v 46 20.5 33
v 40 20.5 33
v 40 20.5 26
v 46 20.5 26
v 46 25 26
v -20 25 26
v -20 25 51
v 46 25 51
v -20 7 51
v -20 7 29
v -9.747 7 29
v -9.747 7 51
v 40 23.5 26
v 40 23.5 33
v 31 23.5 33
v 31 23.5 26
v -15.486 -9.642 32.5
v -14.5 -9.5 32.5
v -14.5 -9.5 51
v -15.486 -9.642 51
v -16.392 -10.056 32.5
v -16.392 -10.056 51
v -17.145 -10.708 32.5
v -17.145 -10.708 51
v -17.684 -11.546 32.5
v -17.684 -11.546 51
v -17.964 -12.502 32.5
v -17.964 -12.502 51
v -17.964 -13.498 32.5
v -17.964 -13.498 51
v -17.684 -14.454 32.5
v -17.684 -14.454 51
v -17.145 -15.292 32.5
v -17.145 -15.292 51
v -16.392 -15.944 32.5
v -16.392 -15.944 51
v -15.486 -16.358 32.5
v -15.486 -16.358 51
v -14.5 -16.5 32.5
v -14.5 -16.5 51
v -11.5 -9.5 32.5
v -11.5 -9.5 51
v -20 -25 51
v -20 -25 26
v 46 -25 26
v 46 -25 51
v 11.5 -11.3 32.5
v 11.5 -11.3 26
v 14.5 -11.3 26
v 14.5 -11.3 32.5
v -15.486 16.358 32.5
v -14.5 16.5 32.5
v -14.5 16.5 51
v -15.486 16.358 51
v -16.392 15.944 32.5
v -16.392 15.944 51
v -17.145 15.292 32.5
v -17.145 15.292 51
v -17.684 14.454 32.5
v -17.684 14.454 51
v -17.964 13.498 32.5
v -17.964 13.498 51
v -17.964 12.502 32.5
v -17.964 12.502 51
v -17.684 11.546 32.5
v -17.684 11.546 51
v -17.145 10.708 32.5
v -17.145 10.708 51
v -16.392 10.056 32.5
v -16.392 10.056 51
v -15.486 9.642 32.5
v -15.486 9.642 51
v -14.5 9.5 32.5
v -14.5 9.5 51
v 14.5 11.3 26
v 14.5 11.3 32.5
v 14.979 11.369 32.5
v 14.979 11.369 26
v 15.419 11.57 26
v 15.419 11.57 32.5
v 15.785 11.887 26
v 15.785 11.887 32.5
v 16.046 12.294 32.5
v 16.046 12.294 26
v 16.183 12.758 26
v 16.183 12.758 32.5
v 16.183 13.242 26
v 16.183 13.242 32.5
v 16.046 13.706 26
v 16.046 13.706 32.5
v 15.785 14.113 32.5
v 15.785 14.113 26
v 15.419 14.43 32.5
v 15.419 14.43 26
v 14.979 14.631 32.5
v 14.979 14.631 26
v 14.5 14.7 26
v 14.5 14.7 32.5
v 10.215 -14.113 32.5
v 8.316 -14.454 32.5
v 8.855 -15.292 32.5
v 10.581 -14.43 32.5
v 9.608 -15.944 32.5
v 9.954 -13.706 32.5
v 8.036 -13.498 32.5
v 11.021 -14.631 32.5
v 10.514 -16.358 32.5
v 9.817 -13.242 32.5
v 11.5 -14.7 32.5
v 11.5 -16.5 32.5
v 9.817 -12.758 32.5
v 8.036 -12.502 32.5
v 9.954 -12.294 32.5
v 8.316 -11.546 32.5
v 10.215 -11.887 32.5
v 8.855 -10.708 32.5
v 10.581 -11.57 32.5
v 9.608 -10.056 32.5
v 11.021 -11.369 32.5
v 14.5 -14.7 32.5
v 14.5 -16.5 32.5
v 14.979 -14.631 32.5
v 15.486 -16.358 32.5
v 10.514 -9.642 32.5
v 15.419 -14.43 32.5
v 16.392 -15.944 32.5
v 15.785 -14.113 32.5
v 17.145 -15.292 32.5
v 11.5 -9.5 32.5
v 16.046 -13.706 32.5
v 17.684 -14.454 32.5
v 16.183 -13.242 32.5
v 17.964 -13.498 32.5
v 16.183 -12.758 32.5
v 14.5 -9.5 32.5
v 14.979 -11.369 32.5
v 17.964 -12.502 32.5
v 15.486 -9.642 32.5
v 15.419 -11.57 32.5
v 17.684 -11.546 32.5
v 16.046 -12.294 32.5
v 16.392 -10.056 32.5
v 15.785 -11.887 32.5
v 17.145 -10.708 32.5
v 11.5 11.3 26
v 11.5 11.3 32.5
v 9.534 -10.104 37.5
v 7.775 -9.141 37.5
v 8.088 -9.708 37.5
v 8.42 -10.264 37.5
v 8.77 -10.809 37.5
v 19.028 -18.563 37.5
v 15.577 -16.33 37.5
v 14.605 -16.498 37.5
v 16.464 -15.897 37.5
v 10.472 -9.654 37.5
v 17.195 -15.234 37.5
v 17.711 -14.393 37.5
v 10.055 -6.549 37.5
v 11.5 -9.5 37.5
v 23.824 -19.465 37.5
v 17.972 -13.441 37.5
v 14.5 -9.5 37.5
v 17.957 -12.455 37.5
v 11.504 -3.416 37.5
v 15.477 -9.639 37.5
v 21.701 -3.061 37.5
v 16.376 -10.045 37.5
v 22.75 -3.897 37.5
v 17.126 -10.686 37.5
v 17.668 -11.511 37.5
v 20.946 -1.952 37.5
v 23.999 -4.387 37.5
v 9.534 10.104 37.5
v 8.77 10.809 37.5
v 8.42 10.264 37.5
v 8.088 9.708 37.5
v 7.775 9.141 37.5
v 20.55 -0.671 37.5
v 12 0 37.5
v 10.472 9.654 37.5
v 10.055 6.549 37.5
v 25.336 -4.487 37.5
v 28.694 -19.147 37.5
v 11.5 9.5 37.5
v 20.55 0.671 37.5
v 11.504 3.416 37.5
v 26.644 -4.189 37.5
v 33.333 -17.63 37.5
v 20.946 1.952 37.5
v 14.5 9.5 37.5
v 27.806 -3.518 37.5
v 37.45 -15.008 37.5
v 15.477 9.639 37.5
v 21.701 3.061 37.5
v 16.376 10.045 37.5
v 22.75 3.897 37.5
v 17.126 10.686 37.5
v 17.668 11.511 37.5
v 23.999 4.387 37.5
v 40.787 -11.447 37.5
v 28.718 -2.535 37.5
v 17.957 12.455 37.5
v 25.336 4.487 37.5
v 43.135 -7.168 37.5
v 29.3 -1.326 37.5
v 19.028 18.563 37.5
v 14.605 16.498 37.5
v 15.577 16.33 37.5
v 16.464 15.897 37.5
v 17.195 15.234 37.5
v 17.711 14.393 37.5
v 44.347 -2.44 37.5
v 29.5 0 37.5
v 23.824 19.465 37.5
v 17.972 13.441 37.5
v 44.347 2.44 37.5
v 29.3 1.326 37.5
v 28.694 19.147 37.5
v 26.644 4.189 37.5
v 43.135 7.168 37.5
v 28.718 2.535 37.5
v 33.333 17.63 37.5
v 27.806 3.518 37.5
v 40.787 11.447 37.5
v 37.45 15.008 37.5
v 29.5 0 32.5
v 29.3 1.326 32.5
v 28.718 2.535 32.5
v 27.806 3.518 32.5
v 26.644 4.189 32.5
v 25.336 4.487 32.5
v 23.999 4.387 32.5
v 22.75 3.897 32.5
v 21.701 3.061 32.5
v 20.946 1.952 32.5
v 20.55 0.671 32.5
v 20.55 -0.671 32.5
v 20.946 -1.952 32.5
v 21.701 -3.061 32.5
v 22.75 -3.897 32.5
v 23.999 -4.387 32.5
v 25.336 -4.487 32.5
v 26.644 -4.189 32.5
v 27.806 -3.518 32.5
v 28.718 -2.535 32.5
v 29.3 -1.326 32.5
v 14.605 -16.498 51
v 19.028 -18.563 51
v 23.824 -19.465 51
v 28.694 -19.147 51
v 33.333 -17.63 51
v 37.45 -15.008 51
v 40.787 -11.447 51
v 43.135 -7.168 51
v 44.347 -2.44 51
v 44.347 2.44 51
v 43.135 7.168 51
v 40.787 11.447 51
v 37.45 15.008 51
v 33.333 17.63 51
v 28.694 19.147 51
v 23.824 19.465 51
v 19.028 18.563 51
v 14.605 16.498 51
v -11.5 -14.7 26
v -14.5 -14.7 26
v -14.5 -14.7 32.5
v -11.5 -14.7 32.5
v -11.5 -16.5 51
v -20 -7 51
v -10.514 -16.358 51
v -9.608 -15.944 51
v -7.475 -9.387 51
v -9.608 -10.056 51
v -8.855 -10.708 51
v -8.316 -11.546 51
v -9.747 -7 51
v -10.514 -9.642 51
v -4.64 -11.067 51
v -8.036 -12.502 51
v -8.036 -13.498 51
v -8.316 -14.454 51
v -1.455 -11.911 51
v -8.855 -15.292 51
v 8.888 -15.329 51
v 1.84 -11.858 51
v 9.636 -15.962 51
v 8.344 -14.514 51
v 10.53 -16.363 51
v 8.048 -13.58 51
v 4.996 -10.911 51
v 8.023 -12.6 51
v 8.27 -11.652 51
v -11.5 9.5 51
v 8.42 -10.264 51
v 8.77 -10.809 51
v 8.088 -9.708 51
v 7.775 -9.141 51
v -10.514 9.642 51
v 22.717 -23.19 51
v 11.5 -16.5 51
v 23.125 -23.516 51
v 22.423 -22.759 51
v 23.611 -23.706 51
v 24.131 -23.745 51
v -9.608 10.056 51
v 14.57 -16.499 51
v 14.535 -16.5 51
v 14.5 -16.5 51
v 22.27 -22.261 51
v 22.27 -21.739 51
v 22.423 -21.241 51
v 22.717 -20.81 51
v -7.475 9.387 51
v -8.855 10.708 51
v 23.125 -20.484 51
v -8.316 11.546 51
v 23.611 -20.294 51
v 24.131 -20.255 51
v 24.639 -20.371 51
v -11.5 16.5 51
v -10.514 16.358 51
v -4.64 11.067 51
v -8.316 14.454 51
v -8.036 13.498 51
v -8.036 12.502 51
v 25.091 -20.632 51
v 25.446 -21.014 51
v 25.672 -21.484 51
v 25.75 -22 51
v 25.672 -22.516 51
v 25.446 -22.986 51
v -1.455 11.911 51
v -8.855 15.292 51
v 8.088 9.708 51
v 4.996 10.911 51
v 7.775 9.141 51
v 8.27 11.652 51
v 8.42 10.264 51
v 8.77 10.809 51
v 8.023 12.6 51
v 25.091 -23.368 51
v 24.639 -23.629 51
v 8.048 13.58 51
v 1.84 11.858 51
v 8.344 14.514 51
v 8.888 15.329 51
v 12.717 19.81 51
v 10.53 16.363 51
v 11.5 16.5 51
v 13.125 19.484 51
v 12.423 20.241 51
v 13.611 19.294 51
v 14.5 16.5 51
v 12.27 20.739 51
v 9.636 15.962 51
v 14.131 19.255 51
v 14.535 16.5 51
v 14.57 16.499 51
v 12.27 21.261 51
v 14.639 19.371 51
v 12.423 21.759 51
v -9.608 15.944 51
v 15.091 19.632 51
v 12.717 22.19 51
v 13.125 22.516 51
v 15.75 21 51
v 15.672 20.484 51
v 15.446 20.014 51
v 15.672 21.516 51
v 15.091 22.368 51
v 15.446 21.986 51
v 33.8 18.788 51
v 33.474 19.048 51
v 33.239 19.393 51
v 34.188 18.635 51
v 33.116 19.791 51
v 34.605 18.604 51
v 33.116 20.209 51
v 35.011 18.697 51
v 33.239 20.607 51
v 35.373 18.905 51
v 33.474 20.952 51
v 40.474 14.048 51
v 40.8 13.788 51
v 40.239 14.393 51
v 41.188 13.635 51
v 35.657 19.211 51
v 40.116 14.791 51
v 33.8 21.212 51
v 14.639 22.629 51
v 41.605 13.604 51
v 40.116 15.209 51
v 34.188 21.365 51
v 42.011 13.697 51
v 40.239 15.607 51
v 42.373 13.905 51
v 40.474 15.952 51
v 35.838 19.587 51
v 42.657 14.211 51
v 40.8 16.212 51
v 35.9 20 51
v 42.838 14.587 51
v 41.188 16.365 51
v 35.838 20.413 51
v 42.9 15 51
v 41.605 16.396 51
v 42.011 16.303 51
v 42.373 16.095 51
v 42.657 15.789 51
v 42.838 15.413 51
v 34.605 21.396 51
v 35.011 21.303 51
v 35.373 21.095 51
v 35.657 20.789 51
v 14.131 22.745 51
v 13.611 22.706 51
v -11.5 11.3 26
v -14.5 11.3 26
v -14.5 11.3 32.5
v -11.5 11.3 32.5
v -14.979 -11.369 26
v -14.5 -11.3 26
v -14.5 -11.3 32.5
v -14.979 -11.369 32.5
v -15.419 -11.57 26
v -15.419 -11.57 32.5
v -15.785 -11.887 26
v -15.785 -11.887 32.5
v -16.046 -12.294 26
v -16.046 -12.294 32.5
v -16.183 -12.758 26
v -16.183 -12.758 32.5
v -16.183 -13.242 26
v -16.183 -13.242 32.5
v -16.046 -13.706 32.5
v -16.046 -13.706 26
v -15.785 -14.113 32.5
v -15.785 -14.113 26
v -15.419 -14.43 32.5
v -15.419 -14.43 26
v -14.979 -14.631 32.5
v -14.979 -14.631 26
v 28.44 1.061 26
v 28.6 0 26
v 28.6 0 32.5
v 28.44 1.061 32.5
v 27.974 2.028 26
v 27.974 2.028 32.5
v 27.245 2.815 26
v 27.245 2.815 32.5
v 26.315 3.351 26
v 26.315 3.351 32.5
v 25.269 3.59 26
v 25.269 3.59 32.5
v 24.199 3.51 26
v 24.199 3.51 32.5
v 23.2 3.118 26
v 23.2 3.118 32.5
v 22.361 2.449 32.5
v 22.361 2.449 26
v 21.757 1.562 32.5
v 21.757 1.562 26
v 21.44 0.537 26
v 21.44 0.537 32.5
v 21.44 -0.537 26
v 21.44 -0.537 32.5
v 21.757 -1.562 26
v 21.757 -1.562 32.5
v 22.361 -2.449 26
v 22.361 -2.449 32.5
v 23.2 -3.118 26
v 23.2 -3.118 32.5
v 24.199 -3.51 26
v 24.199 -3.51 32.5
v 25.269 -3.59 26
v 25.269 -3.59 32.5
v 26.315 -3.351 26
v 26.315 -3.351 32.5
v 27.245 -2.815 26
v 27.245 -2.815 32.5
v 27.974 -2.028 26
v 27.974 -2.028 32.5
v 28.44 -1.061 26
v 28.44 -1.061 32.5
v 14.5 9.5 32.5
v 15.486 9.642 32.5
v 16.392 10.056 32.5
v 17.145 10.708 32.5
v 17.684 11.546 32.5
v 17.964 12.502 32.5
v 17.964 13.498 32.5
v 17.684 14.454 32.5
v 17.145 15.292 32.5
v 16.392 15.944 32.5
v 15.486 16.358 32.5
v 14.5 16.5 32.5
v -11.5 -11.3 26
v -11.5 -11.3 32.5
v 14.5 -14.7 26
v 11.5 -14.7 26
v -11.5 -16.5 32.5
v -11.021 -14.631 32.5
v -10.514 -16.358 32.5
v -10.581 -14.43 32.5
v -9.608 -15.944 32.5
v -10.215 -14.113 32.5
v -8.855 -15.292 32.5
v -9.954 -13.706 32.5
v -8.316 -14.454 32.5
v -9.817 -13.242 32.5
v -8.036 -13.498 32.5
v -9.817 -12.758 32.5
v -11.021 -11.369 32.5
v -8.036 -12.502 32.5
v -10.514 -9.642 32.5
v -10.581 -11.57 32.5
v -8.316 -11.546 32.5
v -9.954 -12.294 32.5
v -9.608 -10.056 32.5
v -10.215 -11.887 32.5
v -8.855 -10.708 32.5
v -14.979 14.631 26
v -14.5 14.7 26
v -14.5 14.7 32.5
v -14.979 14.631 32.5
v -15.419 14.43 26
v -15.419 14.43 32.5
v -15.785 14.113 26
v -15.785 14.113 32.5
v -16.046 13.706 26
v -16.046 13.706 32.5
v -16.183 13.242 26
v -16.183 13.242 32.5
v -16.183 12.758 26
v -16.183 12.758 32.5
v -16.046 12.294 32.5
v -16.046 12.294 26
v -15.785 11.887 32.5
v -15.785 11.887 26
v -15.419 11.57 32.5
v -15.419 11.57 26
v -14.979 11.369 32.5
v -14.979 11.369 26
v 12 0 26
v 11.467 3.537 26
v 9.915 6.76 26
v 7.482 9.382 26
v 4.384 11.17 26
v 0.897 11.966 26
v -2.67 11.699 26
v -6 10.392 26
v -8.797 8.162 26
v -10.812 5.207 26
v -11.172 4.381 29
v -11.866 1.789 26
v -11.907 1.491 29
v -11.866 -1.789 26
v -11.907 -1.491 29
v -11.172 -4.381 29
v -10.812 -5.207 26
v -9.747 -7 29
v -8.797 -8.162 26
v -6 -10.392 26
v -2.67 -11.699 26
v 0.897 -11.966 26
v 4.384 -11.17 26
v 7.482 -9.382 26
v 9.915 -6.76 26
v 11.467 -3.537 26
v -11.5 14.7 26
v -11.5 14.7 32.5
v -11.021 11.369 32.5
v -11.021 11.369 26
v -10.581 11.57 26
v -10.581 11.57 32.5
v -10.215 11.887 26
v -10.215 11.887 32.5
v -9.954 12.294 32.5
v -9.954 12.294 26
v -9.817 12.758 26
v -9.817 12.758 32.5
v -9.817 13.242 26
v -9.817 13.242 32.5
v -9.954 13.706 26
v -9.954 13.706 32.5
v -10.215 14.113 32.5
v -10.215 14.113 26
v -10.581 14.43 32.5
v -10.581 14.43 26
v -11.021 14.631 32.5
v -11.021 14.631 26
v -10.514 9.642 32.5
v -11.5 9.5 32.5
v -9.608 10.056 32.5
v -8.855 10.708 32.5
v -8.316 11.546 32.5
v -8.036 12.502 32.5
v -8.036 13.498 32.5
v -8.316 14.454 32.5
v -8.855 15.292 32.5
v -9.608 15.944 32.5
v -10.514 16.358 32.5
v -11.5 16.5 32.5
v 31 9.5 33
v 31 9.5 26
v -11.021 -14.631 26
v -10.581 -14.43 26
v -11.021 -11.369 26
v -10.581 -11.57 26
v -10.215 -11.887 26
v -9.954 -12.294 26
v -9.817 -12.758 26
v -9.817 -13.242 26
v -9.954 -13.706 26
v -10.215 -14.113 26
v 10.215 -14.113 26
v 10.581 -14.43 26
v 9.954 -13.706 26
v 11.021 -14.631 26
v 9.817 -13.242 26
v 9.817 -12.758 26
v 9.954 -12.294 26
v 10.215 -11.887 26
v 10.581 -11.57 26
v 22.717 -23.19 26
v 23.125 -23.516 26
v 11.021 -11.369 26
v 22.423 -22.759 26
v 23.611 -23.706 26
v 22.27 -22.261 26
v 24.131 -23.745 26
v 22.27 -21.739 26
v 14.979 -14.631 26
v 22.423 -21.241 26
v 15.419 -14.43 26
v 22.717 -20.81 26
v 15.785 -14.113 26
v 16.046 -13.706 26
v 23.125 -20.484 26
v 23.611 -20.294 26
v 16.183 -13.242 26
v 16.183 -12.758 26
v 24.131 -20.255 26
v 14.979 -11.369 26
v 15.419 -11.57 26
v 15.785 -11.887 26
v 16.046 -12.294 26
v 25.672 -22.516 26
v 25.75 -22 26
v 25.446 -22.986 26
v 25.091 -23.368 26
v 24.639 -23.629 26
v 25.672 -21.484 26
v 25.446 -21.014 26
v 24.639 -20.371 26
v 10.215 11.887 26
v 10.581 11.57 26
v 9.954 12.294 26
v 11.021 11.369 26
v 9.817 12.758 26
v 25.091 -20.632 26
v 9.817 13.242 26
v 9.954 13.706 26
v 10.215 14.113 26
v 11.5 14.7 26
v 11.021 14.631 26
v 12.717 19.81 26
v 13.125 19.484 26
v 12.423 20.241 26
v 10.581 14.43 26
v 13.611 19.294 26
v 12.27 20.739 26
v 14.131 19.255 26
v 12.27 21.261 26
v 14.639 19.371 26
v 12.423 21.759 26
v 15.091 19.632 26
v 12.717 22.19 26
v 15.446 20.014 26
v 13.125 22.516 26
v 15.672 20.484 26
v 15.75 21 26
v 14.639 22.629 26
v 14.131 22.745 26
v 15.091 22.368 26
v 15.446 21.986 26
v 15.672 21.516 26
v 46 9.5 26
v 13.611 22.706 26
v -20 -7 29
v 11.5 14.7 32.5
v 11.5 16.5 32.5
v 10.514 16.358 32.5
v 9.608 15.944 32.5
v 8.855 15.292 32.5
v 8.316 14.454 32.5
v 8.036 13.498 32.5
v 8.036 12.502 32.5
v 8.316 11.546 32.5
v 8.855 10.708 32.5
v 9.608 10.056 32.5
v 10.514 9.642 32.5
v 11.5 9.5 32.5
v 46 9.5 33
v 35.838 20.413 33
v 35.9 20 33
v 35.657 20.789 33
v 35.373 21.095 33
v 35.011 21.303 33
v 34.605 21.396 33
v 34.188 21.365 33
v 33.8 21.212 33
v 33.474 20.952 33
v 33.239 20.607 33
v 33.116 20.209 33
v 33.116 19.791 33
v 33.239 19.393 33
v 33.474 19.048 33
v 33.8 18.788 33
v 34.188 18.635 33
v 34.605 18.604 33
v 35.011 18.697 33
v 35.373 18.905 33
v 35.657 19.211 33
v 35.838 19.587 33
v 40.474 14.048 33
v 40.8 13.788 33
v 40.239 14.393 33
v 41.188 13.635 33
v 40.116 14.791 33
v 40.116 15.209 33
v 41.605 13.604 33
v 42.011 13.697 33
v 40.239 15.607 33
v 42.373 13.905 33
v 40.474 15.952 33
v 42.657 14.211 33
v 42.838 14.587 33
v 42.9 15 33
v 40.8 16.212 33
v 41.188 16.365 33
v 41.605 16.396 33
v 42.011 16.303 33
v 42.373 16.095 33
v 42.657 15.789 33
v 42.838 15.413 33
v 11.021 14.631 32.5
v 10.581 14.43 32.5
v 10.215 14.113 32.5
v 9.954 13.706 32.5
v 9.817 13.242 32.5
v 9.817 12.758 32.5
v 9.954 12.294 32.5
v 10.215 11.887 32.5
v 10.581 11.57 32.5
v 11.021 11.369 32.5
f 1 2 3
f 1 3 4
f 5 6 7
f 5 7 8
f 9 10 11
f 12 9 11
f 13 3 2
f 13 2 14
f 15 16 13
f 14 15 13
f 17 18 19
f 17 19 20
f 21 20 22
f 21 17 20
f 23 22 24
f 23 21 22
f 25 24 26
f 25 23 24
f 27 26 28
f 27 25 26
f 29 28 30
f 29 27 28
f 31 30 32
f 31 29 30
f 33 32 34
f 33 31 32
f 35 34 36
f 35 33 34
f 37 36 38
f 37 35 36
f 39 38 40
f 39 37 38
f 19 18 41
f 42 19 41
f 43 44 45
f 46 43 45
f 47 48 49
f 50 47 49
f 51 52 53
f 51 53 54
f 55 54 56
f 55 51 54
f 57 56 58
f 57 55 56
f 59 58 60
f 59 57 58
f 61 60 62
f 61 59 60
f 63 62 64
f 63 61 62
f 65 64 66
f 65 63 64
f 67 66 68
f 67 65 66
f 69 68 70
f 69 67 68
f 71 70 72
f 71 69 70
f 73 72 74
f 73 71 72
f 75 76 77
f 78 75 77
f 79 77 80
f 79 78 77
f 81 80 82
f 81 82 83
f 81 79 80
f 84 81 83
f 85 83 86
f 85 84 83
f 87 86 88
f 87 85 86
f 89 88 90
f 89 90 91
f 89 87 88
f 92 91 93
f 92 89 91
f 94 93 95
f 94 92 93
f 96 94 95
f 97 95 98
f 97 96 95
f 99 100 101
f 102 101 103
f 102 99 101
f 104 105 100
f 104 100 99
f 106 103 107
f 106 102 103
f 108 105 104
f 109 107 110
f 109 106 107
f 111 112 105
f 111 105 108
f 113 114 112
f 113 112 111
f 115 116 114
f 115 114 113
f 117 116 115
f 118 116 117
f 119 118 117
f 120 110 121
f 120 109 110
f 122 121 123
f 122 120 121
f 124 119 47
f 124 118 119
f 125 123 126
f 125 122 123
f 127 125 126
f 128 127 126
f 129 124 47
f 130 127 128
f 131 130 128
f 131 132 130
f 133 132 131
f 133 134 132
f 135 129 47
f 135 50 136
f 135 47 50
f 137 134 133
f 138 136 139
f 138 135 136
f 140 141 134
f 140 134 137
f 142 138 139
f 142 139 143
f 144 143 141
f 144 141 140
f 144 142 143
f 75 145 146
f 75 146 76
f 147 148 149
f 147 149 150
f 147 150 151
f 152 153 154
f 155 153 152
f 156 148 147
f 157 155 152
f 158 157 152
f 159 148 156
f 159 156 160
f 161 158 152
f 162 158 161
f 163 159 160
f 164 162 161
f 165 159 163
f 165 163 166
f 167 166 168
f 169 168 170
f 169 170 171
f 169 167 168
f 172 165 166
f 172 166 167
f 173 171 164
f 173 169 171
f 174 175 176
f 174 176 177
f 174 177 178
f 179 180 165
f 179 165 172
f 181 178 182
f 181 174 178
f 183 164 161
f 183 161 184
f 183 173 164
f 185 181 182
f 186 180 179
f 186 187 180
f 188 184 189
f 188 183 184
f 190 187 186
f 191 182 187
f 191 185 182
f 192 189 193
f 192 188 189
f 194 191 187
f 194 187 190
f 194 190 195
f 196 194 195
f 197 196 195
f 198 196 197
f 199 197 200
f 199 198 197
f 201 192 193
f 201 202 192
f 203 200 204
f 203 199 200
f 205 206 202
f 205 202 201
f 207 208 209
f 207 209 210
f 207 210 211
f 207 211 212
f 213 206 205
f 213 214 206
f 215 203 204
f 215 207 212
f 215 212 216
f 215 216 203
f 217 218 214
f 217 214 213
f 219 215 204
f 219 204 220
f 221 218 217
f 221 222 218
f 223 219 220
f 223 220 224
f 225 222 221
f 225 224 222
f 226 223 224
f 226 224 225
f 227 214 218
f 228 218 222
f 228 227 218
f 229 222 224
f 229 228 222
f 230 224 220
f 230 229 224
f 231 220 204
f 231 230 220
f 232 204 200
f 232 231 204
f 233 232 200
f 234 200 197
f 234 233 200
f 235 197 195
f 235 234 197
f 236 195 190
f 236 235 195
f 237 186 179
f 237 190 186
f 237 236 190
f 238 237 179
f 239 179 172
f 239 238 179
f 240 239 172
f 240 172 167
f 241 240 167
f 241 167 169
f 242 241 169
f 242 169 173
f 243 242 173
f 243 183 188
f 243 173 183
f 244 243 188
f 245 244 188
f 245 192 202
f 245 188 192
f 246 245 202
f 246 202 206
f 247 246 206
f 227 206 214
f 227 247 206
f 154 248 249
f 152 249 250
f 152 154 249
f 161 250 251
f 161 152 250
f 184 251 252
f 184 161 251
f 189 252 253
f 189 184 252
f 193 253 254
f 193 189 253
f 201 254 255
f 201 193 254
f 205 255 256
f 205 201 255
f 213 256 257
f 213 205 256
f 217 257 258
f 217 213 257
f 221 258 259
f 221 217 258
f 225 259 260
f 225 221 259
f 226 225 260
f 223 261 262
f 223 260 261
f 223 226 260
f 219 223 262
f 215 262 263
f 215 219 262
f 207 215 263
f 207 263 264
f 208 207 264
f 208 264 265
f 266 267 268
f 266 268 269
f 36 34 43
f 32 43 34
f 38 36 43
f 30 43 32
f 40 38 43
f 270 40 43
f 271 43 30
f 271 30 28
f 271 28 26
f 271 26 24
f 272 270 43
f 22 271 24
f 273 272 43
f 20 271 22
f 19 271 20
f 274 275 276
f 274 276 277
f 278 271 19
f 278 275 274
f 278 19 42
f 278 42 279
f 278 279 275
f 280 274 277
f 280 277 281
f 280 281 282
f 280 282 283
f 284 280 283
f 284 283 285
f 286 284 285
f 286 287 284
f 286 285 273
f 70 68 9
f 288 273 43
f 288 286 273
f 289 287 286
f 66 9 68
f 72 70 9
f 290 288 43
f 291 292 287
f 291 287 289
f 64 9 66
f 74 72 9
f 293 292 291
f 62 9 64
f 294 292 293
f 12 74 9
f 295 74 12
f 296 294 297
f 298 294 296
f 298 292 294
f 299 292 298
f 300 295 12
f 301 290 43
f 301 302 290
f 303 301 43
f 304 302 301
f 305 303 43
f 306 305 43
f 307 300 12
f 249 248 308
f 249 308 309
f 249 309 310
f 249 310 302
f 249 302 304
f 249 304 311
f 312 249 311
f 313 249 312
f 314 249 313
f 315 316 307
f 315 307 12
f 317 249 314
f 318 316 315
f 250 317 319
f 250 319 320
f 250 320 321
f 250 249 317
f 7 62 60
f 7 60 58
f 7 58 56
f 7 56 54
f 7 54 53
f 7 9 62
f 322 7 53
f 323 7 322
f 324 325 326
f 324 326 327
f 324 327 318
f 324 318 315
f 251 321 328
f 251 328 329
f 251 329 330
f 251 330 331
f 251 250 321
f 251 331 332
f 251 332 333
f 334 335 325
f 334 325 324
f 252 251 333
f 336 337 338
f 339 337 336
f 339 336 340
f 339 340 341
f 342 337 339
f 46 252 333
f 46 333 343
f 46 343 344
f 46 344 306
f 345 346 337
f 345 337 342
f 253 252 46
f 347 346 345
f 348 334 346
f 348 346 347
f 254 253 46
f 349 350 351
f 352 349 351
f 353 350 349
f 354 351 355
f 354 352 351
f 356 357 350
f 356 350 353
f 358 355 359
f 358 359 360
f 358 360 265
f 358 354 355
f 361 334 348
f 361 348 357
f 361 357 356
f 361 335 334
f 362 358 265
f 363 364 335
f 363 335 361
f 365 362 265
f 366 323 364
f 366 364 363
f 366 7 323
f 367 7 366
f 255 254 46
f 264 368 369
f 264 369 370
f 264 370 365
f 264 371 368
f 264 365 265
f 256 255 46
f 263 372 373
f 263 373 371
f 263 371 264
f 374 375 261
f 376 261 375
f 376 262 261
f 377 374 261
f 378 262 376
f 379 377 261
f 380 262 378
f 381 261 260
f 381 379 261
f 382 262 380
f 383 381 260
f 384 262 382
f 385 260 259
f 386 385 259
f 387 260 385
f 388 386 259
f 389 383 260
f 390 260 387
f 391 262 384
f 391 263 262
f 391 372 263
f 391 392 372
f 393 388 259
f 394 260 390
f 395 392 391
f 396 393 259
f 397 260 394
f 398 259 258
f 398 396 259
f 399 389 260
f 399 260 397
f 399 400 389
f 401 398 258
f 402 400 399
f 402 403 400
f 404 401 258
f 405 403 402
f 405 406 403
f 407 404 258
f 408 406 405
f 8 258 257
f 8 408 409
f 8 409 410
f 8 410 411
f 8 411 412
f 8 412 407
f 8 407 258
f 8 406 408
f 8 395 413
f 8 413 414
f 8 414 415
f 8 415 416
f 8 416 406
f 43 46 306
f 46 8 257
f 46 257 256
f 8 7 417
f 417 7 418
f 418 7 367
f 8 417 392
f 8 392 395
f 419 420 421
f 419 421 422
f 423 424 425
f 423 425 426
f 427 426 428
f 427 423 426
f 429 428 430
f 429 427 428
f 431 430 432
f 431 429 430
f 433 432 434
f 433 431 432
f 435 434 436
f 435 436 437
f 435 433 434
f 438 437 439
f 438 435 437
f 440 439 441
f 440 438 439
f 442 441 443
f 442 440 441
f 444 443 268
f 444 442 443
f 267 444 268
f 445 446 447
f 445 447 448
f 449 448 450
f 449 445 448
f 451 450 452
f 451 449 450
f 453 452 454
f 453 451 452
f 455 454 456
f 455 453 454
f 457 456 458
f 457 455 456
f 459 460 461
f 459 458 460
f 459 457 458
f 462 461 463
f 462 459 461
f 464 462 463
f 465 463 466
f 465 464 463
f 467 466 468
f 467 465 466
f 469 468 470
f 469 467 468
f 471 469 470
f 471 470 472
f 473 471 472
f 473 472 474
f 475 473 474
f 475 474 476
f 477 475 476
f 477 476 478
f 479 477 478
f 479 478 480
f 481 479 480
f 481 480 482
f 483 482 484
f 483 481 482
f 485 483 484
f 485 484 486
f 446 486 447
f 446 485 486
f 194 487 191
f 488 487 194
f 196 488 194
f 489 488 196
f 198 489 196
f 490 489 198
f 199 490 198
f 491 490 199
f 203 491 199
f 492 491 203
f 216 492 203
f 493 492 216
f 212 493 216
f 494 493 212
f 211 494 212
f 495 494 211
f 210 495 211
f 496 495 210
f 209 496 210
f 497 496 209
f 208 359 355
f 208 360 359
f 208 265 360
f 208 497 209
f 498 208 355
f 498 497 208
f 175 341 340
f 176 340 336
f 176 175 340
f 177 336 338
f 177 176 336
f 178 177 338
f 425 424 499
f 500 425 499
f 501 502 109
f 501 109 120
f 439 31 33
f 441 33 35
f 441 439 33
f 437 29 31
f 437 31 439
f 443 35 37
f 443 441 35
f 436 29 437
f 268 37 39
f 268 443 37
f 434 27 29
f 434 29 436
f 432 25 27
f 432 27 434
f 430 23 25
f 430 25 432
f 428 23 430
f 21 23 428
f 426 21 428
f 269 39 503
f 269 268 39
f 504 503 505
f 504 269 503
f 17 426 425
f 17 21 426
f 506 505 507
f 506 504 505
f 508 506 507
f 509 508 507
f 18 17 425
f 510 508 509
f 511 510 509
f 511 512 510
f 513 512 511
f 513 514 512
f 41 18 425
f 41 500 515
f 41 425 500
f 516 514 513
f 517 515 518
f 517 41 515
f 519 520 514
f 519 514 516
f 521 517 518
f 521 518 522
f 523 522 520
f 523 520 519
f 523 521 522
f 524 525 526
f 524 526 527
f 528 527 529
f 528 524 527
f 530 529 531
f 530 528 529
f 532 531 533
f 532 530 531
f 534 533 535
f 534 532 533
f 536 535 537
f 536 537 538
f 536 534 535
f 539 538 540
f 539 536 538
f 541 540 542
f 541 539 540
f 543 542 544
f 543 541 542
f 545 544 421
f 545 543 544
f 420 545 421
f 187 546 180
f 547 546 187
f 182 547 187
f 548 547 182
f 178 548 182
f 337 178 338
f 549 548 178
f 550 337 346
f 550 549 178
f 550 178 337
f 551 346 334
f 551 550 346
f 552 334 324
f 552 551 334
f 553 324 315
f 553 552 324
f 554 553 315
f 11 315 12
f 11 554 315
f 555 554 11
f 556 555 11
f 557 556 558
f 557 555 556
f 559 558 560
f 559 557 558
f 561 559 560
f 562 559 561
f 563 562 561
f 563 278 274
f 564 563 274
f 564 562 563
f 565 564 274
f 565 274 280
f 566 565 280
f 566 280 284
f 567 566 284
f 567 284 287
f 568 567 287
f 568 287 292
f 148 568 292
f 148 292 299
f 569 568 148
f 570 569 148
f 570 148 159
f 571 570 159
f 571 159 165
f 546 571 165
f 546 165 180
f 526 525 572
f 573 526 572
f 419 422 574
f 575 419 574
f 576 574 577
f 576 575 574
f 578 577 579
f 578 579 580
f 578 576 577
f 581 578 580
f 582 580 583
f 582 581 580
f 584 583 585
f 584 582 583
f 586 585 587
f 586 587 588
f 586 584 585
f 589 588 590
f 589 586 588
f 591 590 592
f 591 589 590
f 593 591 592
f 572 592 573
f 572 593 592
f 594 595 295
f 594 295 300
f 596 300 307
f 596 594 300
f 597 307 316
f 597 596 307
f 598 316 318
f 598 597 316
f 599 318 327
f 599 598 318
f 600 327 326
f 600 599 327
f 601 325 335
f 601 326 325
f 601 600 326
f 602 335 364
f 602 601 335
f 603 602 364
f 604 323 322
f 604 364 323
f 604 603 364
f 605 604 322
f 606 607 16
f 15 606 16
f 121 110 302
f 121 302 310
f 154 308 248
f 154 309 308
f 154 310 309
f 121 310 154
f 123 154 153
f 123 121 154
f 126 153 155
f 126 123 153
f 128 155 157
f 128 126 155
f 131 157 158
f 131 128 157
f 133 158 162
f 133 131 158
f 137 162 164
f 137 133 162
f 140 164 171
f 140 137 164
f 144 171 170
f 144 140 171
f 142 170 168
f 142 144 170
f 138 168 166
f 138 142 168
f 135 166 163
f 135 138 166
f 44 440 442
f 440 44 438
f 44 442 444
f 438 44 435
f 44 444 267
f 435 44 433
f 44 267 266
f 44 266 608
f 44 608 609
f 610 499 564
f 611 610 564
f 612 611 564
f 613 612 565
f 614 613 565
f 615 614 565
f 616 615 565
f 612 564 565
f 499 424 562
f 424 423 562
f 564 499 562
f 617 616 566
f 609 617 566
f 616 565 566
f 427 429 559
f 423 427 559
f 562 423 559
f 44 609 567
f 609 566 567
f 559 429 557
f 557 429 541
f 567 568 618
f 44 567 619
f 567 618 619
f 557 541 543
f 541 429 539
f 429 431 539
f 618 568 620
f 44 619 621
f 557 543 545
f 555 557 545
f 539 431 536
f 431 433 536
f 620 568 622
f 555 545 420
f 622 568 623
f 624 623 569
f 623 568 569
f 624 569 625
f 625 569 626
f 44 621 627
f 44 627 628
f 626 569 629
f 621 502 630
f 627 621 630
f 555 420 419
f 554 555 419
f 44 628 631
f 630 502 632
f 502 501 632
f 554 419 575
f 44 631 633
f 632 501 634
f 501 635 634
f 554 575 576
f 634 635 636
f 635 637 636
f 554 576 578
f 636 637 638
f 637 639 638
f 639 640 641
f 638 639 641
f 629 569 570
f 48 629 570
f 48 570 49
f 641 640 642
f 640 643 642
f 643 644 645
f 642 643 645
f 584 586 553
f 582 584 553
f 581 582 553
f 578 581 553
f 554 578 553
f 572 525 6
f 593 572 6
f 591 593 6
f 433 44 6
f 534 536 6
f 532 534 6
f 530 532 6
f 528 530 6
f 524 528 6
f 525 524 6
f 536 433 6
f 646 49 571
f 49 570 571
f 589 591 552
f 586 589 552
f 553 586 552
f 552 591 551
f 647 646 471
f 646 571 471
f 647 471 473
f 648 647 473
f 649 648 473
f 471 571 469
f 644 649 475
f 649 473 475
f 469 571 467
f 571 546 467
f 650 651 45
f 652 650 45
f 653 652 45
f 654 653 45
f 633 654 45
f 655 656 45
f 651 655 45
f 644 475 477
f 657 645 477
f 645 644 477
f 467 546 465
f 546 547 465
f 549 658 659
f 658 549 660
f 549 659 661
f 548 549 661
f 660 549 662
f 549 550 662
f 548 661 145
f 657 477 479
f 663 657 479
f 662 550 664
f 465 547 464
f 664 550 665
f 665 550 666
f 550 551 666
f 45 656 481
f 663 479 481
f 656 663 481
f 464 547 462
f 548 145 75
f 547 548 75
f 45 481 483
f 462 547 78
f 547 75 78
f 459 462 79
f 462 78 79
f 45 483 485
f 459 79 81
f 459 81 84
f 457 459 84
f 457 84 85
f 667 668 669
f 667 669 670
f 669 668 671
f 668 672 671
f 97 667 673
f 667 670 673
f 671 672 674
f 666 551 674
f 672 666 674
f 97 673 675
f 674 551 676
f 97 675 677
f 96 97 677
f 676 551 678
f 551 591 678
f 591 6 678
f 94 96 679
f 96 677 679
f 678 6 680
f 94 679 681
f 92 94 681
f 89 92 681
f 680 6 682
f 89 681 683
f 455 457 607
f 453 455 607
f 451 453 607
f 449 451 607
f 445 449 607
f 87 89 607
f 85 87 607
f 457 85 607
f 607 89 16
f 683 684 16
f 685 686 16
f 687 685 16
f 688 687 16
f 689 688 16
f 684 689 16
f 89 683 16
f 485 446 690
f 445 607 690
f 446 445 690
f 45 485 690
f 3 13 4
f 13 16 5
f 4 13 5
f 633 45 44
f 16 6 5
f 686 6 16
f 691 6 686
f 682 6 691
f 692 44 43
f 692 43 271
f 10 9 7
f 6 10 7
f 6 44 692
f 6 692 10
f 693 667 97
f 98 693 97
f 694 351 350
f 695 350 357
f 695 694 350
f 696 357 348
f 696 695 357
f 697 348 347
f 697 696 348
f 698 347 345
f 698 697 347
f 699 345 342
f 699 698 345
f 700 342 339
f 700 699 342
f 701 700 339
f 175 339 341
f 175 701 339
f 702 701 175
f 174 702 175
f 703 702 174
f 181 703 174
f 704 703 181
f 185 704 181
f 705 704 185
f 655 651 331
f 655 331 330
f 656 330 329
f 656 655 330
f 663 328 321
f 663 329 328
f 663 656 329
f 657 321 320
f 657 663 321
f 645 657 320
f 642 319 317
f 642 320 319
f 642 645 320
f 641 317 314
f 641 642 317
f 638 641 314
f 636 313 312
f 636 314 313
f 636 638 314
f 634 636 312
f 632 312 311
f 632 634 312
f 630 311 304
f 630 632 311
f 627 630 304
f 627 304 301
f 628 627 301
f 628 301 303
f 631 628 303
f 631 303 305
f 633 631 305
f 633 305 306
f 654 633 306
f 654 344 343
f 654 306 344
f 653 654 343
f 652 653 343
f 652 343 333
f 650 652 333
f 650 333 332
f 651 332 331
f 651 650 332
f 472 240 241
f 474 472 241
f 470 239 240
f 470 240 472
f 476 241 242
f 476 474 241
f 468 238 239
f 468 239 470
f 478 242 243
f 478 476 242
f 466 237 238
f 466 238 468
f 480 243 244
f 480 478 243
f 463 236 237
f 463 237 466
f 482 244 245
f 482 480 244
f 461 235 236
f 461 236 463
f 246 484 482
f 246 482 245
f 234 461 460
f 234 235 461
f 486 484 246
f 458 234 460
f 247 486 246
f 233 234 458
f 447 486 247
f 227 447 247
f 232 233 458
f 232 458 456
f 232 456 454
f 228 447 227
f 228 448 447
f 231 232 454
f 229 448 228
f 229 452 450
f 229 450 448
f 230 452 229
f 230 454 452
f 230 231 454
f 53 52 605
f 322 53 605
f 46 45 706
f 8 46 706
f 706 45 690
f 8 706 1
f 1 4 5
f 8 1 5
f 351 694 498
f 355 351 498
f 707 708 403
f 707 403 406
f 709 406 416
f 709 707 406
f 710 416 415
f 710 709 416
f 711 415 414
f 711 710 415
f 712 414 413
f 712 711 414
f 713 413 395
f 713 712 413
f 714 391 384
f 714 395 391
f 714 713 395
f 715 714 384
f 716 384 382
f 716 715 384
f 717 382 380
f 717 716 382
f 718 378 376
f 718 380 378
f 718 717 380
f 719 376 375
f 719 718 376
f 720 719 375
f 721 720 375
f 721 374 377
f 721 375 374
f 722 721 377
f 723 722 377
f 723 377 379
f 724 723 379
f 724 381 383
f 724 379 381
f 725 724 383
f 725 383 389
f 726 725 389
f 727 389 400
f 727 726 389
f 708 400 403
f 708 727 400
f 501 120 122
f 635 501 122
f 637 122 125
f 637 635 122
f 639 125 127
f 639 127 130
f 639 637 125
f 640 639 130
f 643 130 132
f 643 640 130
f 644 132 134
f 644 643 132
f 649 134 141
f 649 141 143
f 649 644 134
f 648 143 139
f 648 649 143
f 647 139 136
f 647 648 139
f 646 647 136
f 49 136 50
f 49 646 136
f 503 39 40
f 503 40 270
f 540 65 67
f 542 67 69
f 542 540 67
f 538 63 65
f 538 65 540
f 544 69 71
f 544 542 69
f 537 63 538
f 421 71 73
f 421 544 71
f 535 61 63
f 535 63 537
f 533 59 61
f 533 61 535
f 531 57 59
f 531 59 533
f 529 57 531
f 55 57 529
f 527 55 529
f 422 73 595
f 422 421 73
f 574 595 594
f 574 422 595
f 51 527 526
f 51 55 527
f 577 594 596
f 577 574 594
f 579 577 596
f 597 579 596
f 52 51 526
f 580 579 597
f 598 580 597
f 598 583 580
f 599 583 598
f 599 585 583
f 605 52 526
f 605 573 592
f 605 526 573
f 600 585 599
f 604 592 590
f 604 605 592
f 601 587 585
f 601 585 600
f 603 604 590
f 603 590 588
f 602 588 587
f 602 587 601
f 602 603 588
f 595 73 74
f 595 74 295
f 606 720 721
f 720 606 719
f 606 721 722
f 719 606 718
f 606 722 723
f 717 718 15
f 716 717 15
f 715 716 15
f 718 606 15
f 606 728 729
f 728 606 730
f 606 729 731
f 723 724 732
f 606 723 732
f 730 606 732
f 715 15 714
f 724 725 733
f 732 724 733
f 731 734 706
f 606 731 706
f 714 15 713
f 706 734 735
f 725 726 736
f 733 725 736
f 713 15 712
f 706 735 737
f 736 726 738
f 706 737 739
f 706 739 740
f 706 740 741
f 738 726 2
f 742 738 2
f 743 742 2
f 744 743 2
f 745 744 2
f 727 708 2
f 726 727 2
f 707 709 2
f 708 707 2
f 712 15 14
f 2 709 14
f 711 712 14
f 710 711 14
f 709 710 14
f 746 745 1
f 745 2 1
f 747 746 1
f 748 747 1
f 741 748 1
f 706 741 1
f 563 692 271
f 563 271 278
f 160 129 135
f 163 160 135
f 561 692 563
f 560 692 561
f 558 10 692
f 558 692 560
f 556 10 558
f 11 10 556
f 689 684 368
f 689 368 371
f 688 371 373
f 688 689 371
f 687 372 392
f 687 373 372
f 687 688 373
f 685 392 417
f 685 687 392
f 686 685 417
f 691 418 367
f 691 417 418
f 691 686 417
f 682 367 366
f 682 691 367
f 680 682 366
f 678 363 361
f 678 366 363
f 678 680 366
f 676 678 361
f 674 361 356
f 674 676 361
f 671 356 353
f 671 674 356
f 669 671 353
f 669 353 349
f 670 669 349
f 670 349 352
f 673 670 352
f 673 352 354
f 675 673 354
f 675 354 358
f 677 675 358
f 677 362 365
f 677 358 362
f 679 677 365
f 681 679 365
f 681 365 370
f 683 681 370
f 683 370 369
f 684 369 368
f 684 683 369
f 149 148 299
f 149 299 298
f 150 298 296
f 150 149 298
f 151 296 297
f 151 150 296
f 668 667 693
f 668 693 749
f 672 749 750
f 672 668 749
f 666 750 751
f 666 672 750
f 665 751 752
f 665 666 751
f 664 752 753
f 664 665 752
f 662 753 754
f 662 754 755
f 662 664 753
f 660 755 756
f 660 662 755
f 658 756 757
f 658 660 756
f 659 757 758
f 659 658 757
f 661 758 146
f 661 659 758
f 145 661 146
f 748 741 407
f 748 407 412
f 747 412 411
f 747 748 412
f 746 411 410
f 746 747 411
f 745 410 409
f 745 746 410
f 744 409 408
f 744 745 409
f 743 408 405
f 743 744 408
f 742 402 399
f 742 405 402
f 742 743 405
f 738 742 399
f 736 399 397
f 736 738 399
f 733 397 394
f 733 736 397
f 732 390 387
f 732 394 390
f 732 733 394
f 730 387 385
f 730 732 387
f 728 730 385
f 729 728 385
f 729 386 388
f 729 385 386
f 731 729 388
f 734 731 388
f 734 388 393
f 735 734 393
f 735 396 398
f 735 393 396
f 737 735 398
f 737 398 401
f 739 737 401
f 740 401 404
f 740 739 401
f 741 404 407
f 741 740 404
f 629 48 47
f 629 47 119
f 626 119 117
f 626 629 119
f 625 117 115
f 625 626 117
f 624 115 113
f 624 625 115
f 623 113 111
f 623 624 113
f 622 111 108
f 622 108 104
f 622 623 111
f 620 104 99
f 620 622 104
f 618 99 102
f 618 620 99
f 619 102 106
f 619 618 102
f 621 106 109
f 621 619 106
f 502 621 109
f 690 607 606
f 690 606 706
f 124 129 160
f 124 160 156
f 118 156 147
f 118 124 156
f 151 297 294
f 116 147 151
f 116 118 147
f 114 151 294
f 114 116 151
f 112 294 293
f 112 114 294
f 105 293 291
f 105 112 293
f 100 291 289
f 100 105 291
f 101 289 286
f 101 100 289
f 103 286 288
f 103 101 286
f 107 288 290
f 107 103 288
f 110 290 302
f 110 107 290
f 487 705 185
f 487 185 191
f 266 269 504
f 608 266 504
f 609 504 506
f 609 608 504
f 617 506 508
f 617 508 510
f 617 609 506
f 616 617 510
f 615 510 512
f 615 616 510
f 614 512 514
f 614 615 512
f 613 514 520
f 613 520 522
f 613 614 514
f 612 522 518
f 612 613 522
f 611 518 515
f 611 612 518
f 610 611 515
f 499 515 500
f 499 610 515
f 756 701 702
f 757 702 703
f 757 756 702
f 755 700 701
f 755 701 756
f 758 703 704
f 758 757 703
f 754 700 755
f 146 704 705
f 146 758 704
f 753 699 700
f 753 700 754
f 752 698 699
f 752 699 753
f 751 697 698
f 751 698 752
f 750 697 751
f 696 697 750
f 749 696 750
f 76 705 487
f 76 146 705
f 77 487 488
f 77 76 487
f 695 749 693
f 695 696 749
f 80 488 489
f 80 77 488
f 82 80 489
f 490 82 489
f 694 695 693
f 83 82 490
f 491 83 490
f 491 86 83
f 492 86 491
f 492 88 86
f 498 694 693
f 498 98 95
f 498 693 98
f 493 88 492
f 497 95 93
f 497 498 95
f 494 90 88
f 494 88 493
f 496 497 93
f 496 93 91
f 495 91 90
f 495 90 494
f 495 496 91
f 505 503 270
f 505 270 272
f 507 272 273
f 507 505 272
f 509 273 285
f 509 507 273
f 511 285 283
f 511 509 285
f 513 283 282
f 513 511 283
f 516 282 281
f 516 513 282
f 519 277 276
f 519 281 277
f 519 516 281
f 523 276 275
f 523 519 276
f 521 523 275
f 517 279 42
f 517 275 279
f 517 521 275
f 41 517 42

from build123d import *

# Parameters (mm, degrees)
BOX043_W          = 20
BOX043_H          = 14
BOX043_DEPTH      = 30
CYLINDER032_R     = 1.75
CYLINDER032_DEPTH = 200
CYLINDER031_R     = 1.75
CYLINDER031_DEPTH = 200
CYLINDER072_R     = 1.4
CYLINDER072_DEPTH = 50
CYLINDER071_R     = 1.4
CYLINDER071_DEPTH = 50
BOX042_W          = 9
BOX042_H          = 5
BOX042_DEPTH      = 7
BOX040_W          = 50
BOX040_H          = 11
BOX040_DEPTH      = 7
CYLINDER019_R     = 4.5
CYLINDER019_DEPTH = 30
CYLINDER018_R     = 3.6
CYLINDER018_DEPTH = 30
CYLINDER016_R     = 19.5
CYLINDER016_DEPTH = 20
CYLINDER017_R     = 12
CYLINDER017_DEPTH = 33
BOX003_W          = 3
BOX003_H          = 7
BOX003_DEPTH      = 25
CYLINDER020_R     = 1.7
CYLINDER020_DEPTH = 25
CYLINDER012_R     = 3.5
CYLINDER012_DEPTH = 25
BOX002_W          = 3
BOX002_H          = 3.4
BOX002_DEPTH      = 15
CYLINDER021_R     = 3.5
CYLINDER021_DEPTH = 25
CYLINDER008_R     = 1.7
CYLINDER008_DEPTH = 25
BOX001_W          = 66
BOX001_H          = 50
BOX001_DEPTH      = 25


with BuildPart() as cube040:
    # Box043 → Box043 (new body)
    with BuildSketch(Plane(origin=(-21, -7, 29), x_dir=(1, 0, 0), z_dir=(0, 0, 1))):
        with Locations((10, 7)):
            Rectangle(BOX043_W, BOX043_H)
    extrude(amount=BOX043_DEPTH)


with BuildPart() as m3_studding003:
    # Cylinder032 → Cylinder032 (new body)
    with BuildSketch(Plane(origin=(24, -22, 0), x_dir=(1, 0, 0), z_dir=(0, 0, 1))):
        Circle(CYLINDER032_R)
    extrude(amount=CYLINDER032_DEPTH)


with BuildPart() as long_stack_studding_a:
    # Cylinder031 → Cylinder031 (new body)
    with BuildSketch(Plane(origin=(14, 21, 0), x_dir=(1, 0, 0), z_dir=(0, 0, 1))):
        Circle(CYLINDER031_R)
    extrude(amount=CYLINDER031_DEPTH)

    # Fusion046: union m3-studding003
    add(m3_studding003.part)


with BuildPart() as m3_studding013:
    # Cylinder072 → Cylinder072 (new body)
    with BuildSketch(Plane(origin=(41.5, 15, -6), x_dir=(1, 0, 0), z_dir=(0, 0, 1))):
        Circle(CYLINDER072_R)
    extrude(amount=CYLINDER072_DEPTH)


with BuildPart() as m3_tap001:
    # Cylinder071 → Cylinder071 (new body)
    with BuildSketch(Plane(origin=(34.5, 20, -6), x_dir=(1, 0, 0), z_dir=(0, 0, 1))):
        Circle(CYLINDER071_R)
    extrude(amount=CYLINDER071_DEPTH)

    # Fusion042: union m3-studding013
    add(m3_studding013.part)


with BuildPart() as m3_tap001_1:
    # Fusion042 placement: moved
    add(m3_tap001.part.moved(Location((0, 0, 10))))


with BuildPart() as cube039:
    # Box042 → Box042 (new body)
    with BuildSketch(Plane(origin=(31, 18.5, 26), x_dir=(1, 0, 0), z_dir=(0, 0, 1))):
        with Locations((4.5, 2.5)):
            Rectangle(BOX042_W, BOX042_H)
    extrude(amount=BOX042_DEPTH)


with BuildPart() as cube037:
    # Box040 → Box040 (new body)
    with BuildSketch(Plane(origin=(31, 9.5, 26), x_dir=(1, 0, 0), z_dir=(0, 0, 1))):
        with Locations((25, 5.5)):
            Rectangle(BOX040_W, BOX040_H)
    extrude(amount=BOX040_DEPTH)


with BuildPart() as f_9mm_bearing:
    # Cylinder019 → Cylinder019 (new body)
    with BuildSketch(Plane(origin=(25, 0, 32.5), x_dir=(1, 0, 0), z_dir=(0, 0, 1))):
        Circle(CYLINDER019_R)
    extrude(amount=CYLINDER019_DEPTH)


with BuildPart() as bearing_and_shaft_holes:
    # Cylinder018 → Cylinder018 (new body)
    with BuildSketch(Plane(origin=(25, 0, 24), x_dir=(1, 0, 0), z_dir=(0, 0, 1))):
        Circle(CYLINDER018_R)
    extrude(amount=CYLINDER018_DEPTH)

    # Fusion007: union 9mm-bearing
    add(f_9mm_bearing.part)


with BuildPart() as big_gear_hole:
    # Cylinder016 → Cylinder016 (new body)
    with BuildSketch(Plane(origin=(25, 0, 37.5), x_dir=(1, 0, 0), z_dir=(0, 0, 1))):
        Circle(CYLINDER016_R)
    extrude(amount=CYLINDER016_DEPTH)


with BuildPart() as gear_holes:
    # Cylinder017 → Cylinder017 (new body)
    with BuildSketch(Plane.XY.offset(25)):
        Circle(CYLINDER017_R)
    extrude(amount=CYLINDER017_DEPTH)

    # Fusion006: union big-gear-hole
    add(big_gear_hole.part)


with BuildPart() as cube003:
    # Box003 → Box003 (new body)
    with BuildSketch(Plane(origin=(13, 9.5, 35.5), x_dir=(1, 0, 0), z_dir=(0, 0, 1))):
        with Locations((1.5, 3.5)):
            Rectangle(BOX003_W, BOX003_H)
    extrude(amount=BOX003_DEPTH)


with BuildPart() as cylinder020:
    # Cylinder020 → Cylinder020 (new body)
    with BuildSketch(Plane(origin=(16, 13, 25), x_dir=(1, 0, 0), z_dir=(0, 0, 1))):
        Circle(CYLINDER020_R)
    extrude(amount=CYLINDER020_DEPTH)


with BuildPart() as cylinder012:
    # Cylinder012 → Cylinder012 (new body)
    with BuildSketch(Plane(origin=(13, 13, 35.5), x_dir=(1, 0, 0), z_dir=(0, 0, 1))):
        Circle(CYLINDER012_R)
    extrude(amount=CYLINDER012_DEPTH)


with BuildPart() as cube002:
    # Box002 → Box002 (new body)
    with BuildSketch(Plane(origin=(13, 11.3, 25), x_dir=(1, 0, 0), z_dir=(0, 0, 1))):
        with Locations((1.5, 1.7)):
            Rectangle(BOX002_W, BOX002_H)
    extrude(amount=BOX002_DEPTH)


with BuildPart() as cylinder021:
    # Cylinder021 → Cylinder021 (new body)
    with BuildSketch(Plane(origin=(16, 13, 35.5), x_dir=(1, 0, 0), z_dir=(0, 0, 1))):
        Circle(CYLINDER021_R)
    extrude(amount=CYLINDER021_DEPTH)


with BuildPart() as cylinder008:
    # Cylinder008 → Cylinder008 (new body)
    with BuildSketch(Plane(origin=(13, 13, 25), x_dir=(1, 0, 0), z_dir=(0, 0, 1))):
        Circle(CYLINDER008_R)
    extrude(amount=CYLINDER008_DEPTH)


with BuildPart() as m3_slot001:
    # Fusion002 base: copy of Cylinder008
    add(cylinder008.part)

    # Fusion002: union Cube003, Cylinder020, Cylinder012, Cube002, Cylinder021
    add(cube003.part)
    add(cylinder020.part)
    add(cylinder012.part)
    add(cube002.part)
    add(cylinder021.part)


with BuildPart() as m3_slot001_1:
    # Fusion002 placement: moved
    add(m3_slot001.part.moved(Location((-27.5, 0, 0))))


with BuildPart() as m3_slot002:
    # Fusion003 base: copy of Cylinder008
    add(cylinder008.part)

    # Fusion003: union Cube003, Cylinder020, Cylinder012, Cube002, Cylinder021
    add(cube003.part)
    add(cylinder020.part)
    add(cylinder012.part)
    add(cube002.part)
    add(cylinder021.part)


with BuildPart() as m3_slot002_1:
    # Fusion003 placement: moved
    add(m3_slot002.part.moved(Location((-27.5, -26, 0))))


with BuildPart() as m3_slot003:
    # Fusion004 base: copy of Cylinder008
    add(cylinder008.part)

    # Fusion004: union Cube003, Cylinder020, Cylinder012, Cube002, Cylinder021
    add(cube003.part)
    add(cylinder020.part)
    add(cylinder012.part)
    add(cube002.part)
    add(cylinder021.part)


with BuildPart() as m3_slot003_1:
    # Fusion004 placement: moved
    add(m3_slot003.part.moved(Location((-1.5, -26, 0))))


with BuildPart() as fusion008:
    # Fusion001 base: copy of Cylinder008
    add(cylinder008.part)

    # Fusion001: union Cube003, Cylinder020, Cylinder012, Cube002, Cylinder021
    add(cube003.part)
    add(cylinder020.part)
    add(cylinder012.part)
    add(cube002.part)
    add(cylinder021.part)


with BuildPart() as fusion008_1:
    # Fusion001 placement: moved
    add(fusion008.part.moved(Location((-1.5, 0, 0))))

    # Fusion005: union M3-slot001, M3-slot002, M3-slot003
    add(m3_slot001_1.part)
    add(m3_slot002_1.part)
    add(m3_slot003_1.part)


with BuildPart() as fusion008_2:
    # Fusion005 placement: moved
    add(fusion008_1.part.moved(Location((0, 0, -3))))

    # Fusion008: union bearing-and-shaft-holes, gear-holes
    add(bearing_and_shaft_holes.part)
    add(gear_holes.part)


with BuildPart() as gearbox:
    # Box001 → Box001 (new body)
    with BuildSketch(Plane(origin=(-20, -25, 26), x_dir=(1, 0, 0), z_dir=(0, 0, 1))):
        with Locations((33, 25)):
            Rectangle(BOX001_W, BOX001_H)
    extrude(amount=BOX001_DEPTH)

    # Cut: cut Fusion008
    add(fusion008_2.part, mode=Mode.SUBTRACT)

    # Cut023: cut Cube037
    add(cube037.part, mode=Mode.SUBTRACT)

    # Cut028: cut Cube039
    add(cube039.part, mode=Mode.SUBTRACT)

    # Cut030: cut M3-tap001
    add(m3_tap001_1.part, mode=Mode.SUBTRACT)

    # Cut034: cut long-stack-studding-a
    add(long_stack_studding_a.part, mode=Mode.SUBTRACT)

    # Cut041: cut Cube040
    add(cube040.part, mode=Mode.SUBTRACT)


solid = gearbox.part
